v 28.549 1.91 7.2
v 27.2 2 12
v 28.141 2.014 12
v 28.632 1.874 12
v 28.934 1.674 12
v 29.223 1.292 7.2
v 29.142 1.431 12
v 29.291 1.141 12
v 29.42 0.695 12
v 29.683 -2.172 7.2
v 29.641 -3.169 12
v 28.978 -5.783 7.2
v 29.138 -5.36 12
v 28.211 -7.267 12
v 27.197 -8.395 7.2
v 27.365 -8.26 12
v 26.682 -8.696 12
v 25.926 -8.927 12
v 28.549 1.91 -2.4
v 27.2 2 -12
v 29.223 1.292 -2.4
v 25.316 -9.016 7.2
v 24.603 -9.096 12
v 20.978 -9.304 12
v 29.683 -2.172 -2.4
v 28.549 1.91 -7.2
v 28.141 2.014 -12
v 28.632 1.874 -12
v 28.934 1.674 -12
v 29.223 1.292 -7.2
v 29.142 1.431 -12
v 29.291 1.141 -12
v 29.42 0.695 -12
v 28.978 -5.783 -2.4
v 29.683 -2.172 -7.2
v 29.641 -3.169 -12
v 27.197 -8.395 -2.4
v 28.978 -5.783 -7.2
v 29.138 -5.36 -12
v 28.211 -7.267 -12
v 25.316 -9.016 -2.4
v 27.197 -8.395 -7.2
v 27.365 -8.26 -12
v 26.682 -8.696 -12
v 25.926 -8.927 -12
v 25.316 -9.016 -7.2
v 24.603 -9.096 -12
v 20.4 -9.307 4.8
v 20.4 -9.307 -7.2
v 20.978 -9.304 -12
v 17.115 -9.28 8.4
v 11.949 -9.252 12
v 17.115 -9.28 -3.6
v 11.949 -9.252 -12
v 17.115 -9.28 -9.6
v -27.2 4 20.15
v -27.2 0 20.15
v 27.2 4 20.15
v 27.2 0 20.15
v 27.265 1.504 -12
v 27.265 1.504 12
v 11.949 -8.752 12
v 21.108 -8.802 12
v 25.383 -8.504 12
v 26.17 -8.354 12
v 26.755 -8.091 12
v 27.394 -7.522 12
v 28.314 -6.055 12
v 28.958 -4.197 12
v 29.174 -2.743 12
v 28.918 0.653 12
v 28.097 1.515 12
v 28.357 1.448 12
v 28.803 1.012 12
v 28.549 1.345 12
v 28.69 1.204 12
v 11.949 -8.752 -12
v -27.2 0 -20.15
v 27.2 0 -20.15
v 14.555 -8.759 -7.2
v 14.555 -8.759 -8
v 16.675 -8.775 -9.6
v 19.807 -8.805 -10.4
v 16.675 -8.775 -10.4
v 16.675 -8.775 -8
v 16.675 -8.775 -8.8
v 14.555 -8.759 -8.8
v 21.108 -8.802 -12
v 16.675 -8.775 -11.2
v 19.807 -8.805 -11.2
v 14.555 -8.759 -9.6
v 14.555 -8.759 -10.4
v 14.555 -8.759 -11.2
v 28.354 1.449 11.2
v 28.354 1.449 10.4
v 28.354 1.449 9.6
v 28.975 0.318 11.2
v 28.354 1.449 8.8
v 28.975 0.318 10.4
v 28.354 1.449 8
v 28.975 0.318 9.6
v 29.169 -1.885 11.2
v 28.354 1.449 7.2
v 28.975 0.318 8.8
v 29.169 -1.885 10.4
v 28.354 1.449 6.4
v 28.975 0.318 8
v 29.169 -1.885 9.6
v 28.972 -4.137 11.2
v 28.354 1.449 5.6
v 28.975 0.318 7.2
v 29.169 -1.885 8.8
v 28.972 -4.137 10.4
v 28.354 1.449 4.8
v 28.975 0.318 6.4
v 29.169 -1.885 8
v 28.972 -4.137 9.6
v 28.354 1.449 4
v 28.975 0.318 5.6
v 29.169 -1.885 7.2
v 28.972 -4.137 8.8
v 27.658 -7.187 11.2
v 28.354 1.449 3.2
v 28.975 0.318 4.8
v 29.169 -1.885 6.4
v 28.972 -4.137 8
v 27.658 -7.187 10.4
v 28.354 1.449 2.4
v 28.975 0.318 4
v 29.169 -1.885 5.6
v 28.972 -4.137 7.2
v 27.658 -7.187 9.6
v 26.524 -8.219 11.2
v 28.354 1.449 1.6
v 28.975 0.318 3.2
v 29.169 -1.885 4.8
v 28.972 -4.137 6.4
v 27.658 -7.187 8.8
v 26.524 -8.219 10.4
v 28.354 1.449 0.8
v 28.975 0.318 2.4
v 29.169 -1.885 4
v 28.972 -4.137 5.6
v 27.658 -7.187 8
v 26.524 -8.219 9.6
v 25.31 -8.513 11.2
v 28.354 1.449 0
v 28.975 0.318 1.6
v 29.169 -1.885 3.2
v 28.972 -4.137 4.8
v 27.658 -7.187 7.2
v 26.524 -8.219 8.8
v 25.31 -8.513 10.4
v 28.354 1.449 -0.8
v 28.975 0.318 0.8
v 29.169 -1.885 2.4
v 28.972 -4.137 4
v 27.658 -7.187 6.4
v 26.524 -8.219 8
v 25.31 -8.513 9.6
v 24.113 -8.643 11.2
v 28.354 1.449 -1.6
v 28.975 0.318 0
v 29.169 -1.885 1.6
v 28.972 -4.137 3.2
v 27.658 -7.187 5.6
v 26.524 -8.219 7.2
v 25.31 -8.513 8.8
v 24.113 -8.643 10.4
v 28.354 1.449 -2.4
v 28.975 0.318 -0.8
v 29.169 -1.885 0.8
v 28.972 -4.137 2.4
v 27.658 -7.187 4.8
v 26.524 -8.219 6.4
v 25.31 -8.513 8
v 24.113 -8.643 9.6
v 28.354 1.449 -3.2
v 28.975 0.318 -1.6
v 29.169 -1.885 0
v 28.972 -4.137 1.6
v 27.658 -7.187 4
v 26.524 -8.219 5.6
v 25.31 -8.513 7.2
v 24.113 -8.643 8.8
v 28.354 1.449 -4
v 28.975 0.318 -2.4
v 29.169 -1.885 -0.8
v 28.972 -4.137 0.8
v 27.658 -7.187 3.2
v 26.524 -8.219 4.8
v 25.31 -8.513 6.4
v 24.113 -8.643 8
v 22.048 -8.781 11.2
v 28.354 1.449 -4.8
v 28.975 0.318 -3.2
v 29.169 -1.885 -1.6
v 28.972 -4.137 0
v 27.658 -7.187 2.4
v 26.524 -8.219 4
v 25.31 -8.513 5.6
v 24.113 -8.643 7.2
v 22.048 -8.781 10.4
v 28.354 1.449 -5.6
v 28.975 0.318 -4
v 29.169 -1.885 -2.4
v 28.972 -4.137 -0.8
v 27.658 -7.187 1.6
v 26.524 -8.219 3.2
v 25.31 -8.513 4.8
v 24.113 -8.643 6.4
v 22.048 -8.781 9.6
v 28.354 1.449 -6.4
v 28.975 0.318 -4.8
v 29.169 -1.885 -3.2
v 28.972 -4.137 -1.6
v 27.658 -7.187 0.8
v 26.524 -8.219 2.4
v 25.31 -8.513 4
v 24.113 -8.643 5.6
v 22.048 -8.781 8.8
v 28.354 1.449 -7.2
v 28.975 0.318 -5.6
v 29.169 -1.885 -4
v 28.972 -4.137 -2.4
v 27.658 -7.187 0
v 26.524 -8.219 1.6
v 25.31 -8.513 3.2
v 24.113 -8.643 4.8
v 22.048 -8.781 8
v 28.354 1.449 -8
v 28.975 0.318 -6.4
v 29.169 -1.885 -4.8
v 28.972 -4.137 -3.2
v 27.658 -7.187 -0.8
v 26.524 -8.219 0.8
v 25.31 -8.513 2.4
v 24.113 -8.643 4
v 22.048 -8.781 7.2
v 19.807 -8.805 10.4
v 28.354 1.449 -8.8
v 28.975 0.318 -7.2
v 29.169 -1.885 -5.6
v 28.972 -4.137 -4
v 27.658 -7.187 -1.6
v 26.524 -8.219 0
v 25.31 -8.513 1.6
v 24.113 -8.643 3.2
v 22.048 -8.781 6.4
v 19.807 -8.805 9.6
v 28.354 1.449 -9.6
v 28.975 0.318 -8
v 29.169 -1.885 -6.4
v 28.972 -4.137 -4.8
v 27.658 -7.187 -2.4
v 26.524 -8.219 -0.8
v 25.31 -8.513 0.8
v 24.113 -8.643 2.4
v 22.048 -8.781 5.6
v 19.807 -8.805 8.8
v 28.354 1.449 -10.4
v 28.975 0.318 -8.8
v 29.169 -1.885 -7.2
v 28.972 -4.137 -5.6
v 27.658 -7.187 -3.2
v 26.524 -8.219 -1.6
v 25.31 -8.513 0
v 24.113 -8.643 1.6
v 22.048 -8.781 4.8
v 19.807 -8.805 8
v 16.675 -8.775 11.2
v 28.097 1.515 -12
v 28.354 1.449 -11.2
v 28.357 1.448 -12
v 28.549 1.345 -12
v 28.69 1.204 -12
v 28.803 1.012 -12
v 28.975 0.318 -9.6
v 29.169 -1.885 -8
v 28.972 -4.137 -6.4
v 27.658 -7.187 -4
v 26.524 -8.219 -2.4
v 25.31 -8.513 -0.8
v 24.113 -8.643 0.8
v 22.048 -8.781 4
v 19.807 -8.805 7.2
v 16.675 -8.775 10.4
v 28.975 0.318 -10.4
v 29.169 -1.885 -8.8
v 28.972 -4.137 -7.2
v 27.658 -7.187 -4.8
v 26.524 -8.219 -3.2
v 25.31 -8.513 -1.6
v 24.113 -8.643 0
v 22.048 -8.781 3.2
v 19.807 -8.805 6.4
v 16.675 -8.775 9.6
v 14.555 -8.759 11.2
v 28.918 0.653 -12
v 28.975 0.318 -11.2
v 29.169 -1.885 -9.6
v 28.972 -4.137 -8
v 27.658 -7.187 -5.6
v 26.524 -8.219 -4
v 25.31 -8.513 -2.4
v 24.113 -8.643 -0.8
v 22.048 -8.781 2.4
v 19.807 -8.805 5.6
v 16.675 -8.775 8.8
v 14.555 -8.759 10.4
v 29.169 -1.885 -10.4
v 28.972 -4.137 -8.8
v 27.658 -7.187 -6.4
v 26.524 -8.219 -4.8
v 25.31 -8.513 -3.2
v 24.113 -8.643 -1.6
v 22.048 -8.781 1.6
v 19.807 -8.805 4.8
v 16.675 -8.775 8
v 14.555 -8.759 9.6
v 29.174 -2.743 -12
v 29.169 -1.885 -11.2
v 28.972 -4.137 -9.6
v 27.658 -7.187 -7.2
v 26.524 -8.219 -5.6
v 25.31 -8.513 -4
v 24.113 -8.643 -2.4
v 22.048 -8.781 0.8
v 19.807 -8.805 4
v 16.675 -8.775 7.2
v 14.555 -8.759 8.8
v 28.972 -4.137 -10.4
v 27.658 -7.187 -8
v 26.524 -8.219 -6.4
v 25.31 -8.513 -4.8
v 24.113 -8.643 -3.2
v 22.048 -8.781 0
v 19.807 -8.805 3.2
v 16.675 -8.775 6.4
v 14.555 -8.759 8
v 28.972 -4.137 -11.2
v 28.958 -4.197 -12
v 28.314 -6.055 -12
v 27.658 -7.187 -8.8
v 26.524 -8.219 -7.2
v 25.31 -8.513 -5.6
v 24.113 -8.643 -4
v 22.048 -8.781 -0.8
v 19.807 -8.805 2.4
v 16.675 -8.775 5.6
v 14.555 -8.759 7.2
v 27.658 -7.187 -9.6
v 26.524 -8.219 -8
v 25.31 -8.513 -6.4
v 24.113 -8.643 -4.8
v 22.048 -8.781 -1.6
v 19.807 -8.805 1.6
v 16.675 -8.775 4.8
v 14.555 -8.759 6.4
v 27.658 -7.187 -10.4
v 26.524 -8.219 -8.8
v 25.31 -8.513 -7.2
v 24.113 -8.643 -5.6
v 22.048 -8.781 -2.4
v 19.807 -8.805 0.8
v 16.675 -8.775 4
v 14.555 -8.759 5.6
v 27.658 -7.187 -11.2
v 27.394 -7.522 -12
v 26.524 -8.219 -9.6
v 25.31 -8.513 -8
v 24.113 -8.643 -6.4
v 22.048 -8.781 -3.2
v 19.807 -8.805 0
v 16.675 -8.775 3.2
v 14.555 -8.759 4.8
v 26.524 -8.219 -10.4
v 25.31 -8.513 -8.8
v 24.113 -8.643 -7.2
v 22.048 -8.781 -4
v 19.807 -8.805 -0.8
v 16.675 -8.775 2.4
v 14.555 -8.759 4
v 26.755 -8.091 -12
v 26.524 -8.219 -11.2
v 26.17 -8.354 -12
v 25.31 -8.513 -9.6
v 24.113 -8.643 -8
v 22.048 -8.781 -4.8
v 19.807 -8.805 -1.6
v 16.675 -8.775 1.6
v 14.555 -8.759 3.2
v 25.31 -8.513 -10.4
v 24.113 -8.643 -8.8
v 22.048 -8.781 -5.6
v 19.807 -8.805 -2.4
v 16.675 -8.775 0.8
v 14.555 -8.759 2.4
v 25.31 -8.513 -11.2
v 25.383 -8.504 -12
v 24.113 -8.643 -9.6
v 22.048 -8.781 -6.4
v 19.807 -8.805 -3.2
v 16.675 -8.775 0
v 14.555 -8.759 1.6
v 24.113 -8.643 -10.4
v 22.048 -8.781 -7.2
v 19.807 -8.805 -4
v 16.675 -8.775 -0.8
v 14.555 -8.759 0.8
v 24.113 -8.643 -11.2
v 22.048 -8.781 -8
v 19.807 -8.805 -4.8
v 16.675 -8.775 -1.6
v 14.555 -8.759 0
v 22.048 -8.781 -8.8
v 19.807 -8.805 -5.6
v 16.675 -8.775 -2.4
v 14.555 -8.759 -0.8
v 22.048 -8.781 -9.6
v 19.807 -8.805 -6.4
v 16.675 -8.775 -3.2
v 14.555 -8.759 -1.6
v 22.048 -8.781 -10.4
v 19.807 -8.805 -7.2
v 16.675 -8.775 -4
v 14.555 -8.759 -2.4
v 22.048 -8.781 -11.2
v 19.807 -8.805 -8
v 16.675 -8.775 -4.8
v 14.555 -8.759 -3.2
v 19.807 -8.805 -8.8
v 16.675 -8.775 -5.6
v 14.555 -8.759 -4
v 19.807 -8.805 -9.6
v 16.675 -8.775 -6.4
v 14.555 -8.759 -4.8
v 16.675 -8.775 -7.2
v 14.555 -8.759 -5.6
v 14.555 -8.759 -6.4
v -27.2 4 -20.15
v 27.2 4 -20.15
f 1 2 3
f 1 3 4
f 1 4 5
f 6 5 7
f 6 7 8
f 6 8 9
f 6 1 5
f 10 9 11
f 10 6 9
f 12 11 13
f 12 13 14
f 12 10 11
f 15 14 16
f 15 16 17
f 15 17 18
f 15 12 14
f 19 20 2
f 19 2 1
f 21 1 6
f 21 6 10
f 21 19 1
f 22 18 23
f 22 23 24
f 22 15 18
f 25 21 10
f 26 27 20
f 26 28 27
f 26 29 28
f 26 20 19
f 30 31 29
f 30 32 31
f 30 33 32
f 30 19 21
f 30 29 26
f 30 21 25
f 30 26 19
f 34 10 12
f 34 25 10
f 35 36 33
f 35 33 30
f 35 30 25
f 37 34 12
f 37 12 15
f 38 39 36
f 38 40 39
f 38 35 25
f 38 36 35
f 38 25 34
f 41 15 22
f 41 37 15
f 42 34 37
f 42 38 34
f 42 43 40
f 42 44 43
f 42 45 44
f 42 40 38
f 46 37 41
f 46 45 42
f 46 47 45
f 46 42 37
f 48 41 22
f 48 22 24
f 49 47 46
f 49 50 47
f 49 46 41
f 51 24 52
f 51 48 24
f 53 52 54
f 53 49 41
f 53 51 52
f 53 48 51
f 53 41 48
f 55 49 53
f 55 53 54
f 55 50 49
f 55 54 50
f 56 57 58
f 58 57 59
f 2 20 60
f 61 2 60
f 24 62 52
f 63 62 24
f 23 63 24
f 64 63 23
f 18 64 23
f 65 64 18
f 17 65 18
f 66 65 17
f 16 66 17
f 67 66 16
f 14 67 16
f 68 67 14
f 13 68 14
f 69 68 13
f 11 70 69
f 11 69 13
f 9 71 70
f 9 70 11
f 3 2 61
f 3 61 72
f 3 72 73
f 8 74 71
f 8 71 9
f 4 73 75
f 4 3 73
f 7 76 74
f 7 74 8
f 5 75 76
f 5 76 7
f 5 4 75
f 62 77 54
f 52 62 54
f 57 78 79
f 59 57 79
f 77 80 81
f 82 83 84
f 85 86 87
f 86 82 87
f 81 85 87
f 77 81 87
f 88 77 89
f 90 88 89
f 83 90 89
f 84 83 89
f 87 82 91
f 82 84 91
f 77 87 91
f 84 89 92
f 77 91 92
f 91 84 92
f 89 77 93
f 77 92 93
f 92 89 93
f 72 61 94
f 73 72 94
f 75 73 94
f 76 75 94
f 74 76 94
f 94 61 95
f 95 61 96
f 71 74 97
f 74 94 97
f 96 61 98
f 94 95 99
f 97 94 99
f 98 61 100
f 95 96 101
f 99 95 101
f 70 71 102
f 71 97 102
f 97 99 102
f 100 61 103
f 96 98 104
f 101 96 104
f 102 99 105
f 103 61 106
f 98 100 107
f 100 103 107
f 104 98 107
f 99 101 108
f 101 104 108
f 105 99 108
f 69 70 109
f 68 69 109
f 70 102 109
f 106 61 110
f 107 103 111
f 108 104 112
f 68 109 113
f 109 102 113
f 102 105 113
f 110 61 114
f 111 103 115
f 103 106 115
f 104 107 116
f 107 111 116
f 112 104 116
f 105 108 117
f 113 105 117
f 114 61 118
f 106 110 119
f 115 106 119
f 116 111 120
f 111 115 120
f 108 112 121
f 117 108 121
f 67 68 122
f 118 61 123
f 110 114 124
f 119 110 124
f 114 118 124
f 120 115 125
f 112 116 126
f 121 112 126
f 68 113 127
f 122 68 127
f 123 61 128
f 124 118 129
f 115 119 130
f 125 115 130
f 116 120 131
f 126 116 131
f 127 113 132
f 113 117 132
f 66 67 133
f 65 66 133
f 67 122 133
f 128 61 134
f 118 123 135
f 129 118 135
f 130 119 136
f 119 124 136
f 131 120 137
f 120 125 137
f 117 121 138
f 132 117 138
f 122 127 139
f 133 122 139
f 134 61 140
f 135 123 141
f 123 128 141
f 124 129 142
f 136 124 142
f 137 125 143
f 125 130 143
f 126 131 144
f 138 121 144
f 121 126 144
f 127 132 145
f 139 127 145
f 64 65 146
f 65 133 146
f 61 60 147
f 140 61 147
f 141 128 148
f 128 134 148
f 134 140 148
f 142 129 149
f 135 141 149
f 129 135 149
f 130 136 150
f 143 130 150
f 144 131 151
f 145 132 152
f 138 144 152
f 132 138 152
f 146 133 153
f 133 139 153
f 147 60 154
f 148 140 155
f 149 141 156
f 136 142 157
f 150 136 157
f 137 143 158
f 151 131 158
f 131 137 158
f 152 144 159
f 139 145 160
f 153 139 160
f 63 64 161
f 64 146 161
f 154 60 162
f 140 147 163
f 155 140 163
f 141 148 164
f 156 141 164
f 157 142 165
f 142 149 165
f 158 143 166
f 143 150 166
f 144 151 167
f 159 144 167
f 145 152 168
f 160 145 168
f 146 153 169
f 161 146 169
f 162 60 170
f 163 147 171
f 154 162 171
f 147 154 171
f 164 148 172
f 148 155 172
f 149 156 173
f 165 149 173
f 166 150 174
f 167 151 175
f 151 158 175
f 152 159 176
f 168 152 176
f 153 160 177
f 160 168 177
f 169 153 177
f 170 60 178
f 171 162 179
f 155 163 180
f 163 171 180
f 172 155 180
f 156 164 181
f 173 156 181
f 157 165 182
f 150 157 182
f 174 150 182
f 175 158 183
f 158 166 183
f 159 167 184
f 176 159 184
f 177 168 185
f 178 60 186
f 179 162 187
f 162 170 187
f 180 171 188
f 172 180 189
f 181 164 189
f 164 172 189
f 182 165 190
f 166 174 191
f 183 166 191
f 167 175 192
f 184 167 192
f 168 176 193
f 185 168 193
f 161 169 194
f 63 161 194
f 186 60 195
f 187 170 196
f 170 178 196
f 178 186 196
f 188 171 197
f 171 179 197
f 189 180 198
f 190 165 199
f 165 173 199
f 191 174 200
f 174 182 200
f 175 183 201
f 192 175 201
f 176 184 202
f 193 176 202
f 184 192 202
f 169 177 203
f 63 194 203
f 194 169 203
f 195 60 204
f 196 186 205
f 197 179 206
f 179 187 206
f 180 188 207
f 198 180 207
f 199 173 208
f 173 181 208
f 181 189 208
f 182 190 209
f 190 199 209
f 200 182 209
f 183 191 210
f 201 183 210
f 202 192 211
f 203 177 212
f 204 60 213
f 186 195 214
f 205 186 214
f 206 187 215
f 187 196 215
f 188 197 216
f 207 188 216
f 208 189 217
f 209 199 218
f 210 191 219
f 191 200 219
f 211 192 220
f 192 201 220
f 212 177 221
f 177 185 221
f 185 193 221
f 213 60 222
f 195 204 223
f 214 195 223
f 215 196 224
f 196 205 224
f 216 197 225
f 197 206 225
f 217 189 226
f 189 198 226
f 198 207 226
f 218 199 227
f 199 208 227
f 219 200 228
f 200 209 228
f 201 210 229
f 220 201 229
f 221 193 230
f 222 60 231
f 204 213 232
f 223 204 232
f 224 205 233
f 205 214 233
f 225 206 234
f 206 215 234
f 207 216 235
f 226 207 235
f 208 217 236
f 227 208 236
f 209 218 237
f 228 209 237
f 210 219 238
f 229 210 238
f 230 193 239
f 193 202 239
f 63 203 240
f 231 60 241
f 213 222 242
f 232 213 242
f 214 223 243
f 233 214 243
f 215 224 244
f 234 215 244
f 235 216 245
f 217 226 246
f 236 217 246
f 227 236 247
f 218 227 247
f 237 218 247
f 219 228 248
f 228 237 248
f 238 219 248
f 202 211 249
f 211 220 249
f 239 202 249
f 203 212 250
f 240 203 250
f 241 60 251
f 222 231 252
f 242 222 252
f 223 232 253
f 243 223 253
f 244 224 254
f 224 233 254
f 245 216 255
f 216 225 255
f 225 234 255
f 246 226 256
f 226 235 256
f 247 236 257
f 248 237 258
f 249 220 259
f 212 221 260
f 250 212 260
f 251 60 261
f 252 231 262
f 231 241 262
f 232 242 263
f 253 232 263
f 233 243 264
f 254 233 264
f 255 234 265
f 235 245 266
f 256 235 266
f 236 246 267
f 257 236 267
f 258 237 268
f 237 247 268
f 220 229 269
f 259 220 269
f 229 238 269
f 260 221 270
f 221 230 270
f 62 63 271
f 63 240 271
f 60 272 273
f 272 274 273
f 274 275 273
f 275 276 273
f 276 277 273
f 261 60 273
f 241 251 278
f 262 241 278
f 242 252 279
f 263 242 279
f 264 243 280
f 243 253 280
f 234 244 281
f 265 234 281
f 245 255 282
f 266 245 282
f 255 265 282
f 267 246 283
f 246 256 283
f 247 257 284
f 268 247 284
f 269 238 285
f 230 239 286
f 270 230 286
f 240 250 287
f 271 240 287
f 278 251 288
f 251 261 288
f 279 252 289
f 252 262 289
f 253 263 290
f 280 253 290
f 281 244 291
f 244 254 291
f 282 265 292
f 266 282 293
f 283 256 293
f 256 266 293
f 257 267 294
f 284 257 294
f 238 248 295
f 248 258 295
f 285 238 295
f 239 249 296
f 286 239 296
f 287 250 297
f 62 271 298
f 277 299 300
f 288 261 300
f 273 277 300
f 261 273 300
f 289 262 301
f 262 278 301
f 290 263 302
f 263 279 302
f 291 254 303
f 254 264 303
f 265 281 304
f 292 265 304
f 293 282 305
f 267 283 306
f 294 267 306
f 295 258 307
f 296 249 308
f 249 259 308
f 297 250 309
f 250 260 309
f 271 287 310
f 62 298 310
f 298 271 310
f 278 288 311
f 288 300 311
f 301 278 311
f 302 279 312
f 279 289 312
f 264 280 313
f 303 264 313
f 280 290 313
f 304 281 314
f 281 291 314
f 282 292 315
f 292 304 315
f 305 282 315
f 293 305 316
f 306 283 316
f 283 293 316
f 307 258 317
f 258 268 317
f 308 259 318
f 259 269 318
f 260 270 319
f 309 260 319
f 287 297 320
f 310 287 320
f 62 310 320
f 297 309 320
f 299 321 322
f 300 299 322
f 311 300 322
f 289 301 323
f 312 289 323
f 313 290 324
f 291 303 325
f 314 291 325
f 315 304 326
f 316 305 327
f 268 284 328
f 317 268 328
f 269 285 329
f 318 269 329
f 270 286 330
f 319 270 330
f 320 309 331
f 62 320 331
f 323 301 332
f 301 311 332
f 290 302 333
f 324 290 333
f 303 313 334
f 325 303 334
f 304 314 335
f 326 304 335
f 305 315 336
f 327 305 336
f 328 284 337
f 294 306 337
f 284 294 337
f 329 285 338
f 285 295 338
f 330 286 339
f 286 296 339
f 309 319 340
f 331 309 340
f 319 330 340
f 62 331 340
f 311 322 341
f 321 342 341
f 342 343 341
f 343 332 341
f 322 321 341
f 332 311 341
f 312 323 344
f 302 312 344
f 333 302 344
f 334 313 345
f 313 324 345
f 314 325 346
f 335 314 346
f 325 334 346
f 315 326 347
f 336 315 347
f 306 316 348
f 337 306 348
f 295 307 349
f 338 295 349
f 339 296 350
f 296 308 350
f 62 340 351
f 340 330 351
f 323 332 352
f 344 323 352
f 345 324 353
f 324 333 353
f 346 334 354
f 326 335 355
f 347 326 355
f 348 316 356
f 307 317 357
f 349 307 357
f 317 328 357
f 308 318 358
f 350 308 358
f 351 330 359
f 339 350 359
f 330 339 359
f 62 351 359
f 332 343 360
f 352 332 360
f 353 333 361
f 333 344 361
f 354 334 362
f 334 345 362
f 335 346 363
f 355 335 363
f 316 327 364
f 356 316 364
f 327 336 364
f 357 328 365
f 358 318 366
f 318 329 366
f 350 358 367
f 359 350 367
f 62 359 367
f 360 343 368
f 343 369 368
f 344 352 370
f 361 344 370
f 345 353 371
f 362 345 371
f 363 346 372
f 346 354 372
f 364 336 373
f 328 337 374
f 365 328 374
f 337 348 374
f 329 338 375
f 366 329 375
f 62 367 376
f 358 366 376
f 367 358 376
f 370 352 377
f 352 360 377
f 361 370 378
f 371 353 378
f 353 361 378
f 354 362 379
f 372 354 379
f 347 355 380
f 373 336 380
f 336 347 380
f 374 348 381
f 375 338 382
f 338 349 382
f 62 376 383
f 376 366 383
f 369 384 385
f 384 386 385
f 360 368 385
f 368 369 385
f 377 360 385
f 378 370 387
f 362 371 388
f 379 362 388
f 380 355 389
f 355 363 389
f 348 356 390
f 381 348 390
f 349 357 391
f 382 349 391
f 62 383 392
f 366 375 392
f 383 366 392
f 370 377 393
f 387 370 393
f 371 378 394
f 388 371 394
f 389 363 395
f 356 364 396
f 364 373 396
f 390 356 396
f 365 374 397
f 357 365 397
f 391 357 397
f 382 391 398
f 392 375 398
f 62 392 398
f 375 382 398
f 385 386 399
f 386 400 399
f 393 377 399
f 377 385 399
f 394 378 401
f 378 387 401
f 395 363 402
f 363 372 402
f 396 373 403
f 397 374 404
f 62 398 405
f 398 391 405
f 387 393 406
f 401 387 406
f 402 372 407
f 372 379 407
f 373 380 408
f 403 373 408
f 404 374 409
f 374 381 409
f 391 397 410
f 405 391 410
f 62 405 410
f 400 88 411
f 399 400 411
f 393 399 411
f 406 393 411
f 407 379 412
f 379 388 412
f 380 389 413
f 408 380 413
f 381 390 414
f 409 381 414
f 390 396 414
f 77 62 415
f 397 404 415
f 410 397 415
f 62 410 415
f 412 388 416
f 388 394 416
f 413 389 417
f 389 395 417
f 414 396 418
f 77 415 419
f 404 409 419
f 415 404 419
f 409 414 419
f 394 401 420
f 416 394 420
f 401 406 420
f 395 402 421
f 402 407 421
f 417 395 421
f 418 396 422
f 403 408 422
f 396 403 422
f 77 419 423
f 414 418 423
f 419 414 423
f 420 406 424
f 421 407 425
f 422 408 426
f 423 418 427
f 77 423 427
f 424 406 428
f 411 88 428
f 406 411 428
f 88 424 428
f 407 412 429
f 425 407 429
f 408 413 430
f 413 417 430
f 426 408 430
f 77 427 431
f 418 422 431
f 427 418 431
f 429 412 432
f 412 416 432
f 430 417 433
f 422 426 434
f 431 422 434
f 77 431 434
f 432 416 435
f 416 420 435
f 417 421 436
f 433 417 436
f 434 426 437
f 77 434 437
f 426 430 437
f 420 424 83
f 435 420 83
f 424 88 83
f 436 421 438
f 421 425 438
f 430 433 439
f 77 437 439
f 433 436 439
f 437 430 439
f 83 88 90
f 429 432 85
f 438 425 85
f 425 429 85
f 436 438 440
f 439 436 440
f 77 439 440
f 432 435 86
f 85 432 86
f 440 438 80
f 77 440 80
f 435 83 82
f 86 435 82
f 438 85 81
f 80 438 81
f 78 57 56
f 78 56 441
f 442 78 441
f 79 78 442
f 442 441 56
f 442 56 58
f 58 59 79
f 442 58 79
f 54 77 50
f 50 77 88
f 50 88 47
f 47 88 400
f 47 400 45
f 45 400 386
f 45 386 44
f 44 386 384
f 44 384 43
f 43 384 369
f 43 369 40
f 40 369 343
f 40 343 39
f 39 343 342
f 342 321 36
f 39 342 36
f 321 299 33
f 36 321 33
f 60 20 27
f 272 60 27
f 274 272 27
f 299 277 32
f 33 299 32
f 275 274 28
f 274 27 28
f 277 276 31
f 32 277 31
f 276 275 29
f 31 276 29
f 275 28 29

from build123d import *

# Parameters (mm, degrees)
SKETCH1_W                = 54.4
SKETCH1_H                = 40.3
BOSS_EXTRUDE1_DEPTH      = 4
BOSS_EXTRUDE2_DEPTH      = 12
BOSS_EXTRUDE2_DEPTH_BACK = 12


with BuildPart() as part:
    # Sketch1 → Boss-Extrude1 (new body)
    with BuildSketch(Plane(origin=(0, 0, 0), x_dir=(1, 0, 0), z_dir=(0, 1, 0))):
        Rectangle(SKETCH1_W, SKETCH1_H)
    extrude(amount=BOSS_EXTRUDE1_DEPTH)


with BuildPart() as body_2:
    # Sketch2 → Boss-Extrude2 (new, two sides: drawn at the far end of the back side and taken through both)
    with BuildSketch(Plane.XY.offset(-BOSS_EXTRUDE2_DEPTH_BACK)):
        with BuildLine():
            Line((27.2, 2), (27.265425298, 1.504298951))
            add(Edge.make_bspline(
                [(27.265425298, 1.504298951), (27.386154399, 1.520233429), (27.644982774, 1.543619289), (28.037083725, 1.537334839), (28.386397309, 1.457640569), (28.612300728, 1.311032107), (28.774048976, 1.102843304), (28.900556663, 0.771743175), (29.007866205, 0.185663718), (29.050539896, -0.761010912), (29.194523642, -1.894649451), (29.18663713, -2.972293861), (28.996026008, -4.141551258), (28.5484368, -5.660533694), (27.860543886, -7.004026934), (27.081612623, -7.889530814), (26.529154623, -8.248154642), (25.944024988, -8.430669855), (25.308818388, -8.51497167), (24.678459334, -8.586111732), (23.917487648, -8.665070283), (23.047916579, -8.736234924), (22.05553748, -8.785755813), (21.017794747, -8.807063394), (19.844723117, -8.80742854), (18.448007358, -8.794210167), (17.025431453, -8.778174866), (15.688145144, -8.766147307), (14.575570532, -8.758480137), (13.54462521, -8.754012365), (12.65950613, -8.752066795), (12.183276318, -8.751716127), (11.949370105, -8.751716127)],
                knots=[0, 0, 0, 0, 0.0078125, 0.015625, 0.03125, 0.046875, 0.0625, 0.078125, 0.09375, 0.125, 0.15625, 0.1875, 0.21875, 0.25, 0.3125, 0.34375, 0.375, 0.40625, 0.4375, 0.46875, 0.5, 0.5625, 0.625, 0.6875, 0.75, 0.8125, 0.875, 0.90625, 0.9375, 0.96875, 0.984375, 1, 1, 1, 1], degree=3))
            Line((11.949370105, -8.751716127), (11.949370105, -9.251716127))
            add(Edge.make_bspline(
                [(27.2, 2), (29.563910735, 2.31200169), (29.402821993, 0.263414704), (29.979123484, -3.957384849), (28.036653444, -8.666537098), (21.582884985, -9.511161553), (20.534574117, -9.251716127), (11.949370105, -9.251716127)],
                knots=[0, 0, 0, 0, 0.127111935, 0.164895416, 0.354174869, 0.44005132, 1, 1, 1, 1], degree=3))
        make_face()
    extrude(amount=BOSS_EXTRUDE2_DEPTH + BOSS_EXTRUDE2_DEPTH_BACK)


solid = Compound([part.part, body_2.part])
